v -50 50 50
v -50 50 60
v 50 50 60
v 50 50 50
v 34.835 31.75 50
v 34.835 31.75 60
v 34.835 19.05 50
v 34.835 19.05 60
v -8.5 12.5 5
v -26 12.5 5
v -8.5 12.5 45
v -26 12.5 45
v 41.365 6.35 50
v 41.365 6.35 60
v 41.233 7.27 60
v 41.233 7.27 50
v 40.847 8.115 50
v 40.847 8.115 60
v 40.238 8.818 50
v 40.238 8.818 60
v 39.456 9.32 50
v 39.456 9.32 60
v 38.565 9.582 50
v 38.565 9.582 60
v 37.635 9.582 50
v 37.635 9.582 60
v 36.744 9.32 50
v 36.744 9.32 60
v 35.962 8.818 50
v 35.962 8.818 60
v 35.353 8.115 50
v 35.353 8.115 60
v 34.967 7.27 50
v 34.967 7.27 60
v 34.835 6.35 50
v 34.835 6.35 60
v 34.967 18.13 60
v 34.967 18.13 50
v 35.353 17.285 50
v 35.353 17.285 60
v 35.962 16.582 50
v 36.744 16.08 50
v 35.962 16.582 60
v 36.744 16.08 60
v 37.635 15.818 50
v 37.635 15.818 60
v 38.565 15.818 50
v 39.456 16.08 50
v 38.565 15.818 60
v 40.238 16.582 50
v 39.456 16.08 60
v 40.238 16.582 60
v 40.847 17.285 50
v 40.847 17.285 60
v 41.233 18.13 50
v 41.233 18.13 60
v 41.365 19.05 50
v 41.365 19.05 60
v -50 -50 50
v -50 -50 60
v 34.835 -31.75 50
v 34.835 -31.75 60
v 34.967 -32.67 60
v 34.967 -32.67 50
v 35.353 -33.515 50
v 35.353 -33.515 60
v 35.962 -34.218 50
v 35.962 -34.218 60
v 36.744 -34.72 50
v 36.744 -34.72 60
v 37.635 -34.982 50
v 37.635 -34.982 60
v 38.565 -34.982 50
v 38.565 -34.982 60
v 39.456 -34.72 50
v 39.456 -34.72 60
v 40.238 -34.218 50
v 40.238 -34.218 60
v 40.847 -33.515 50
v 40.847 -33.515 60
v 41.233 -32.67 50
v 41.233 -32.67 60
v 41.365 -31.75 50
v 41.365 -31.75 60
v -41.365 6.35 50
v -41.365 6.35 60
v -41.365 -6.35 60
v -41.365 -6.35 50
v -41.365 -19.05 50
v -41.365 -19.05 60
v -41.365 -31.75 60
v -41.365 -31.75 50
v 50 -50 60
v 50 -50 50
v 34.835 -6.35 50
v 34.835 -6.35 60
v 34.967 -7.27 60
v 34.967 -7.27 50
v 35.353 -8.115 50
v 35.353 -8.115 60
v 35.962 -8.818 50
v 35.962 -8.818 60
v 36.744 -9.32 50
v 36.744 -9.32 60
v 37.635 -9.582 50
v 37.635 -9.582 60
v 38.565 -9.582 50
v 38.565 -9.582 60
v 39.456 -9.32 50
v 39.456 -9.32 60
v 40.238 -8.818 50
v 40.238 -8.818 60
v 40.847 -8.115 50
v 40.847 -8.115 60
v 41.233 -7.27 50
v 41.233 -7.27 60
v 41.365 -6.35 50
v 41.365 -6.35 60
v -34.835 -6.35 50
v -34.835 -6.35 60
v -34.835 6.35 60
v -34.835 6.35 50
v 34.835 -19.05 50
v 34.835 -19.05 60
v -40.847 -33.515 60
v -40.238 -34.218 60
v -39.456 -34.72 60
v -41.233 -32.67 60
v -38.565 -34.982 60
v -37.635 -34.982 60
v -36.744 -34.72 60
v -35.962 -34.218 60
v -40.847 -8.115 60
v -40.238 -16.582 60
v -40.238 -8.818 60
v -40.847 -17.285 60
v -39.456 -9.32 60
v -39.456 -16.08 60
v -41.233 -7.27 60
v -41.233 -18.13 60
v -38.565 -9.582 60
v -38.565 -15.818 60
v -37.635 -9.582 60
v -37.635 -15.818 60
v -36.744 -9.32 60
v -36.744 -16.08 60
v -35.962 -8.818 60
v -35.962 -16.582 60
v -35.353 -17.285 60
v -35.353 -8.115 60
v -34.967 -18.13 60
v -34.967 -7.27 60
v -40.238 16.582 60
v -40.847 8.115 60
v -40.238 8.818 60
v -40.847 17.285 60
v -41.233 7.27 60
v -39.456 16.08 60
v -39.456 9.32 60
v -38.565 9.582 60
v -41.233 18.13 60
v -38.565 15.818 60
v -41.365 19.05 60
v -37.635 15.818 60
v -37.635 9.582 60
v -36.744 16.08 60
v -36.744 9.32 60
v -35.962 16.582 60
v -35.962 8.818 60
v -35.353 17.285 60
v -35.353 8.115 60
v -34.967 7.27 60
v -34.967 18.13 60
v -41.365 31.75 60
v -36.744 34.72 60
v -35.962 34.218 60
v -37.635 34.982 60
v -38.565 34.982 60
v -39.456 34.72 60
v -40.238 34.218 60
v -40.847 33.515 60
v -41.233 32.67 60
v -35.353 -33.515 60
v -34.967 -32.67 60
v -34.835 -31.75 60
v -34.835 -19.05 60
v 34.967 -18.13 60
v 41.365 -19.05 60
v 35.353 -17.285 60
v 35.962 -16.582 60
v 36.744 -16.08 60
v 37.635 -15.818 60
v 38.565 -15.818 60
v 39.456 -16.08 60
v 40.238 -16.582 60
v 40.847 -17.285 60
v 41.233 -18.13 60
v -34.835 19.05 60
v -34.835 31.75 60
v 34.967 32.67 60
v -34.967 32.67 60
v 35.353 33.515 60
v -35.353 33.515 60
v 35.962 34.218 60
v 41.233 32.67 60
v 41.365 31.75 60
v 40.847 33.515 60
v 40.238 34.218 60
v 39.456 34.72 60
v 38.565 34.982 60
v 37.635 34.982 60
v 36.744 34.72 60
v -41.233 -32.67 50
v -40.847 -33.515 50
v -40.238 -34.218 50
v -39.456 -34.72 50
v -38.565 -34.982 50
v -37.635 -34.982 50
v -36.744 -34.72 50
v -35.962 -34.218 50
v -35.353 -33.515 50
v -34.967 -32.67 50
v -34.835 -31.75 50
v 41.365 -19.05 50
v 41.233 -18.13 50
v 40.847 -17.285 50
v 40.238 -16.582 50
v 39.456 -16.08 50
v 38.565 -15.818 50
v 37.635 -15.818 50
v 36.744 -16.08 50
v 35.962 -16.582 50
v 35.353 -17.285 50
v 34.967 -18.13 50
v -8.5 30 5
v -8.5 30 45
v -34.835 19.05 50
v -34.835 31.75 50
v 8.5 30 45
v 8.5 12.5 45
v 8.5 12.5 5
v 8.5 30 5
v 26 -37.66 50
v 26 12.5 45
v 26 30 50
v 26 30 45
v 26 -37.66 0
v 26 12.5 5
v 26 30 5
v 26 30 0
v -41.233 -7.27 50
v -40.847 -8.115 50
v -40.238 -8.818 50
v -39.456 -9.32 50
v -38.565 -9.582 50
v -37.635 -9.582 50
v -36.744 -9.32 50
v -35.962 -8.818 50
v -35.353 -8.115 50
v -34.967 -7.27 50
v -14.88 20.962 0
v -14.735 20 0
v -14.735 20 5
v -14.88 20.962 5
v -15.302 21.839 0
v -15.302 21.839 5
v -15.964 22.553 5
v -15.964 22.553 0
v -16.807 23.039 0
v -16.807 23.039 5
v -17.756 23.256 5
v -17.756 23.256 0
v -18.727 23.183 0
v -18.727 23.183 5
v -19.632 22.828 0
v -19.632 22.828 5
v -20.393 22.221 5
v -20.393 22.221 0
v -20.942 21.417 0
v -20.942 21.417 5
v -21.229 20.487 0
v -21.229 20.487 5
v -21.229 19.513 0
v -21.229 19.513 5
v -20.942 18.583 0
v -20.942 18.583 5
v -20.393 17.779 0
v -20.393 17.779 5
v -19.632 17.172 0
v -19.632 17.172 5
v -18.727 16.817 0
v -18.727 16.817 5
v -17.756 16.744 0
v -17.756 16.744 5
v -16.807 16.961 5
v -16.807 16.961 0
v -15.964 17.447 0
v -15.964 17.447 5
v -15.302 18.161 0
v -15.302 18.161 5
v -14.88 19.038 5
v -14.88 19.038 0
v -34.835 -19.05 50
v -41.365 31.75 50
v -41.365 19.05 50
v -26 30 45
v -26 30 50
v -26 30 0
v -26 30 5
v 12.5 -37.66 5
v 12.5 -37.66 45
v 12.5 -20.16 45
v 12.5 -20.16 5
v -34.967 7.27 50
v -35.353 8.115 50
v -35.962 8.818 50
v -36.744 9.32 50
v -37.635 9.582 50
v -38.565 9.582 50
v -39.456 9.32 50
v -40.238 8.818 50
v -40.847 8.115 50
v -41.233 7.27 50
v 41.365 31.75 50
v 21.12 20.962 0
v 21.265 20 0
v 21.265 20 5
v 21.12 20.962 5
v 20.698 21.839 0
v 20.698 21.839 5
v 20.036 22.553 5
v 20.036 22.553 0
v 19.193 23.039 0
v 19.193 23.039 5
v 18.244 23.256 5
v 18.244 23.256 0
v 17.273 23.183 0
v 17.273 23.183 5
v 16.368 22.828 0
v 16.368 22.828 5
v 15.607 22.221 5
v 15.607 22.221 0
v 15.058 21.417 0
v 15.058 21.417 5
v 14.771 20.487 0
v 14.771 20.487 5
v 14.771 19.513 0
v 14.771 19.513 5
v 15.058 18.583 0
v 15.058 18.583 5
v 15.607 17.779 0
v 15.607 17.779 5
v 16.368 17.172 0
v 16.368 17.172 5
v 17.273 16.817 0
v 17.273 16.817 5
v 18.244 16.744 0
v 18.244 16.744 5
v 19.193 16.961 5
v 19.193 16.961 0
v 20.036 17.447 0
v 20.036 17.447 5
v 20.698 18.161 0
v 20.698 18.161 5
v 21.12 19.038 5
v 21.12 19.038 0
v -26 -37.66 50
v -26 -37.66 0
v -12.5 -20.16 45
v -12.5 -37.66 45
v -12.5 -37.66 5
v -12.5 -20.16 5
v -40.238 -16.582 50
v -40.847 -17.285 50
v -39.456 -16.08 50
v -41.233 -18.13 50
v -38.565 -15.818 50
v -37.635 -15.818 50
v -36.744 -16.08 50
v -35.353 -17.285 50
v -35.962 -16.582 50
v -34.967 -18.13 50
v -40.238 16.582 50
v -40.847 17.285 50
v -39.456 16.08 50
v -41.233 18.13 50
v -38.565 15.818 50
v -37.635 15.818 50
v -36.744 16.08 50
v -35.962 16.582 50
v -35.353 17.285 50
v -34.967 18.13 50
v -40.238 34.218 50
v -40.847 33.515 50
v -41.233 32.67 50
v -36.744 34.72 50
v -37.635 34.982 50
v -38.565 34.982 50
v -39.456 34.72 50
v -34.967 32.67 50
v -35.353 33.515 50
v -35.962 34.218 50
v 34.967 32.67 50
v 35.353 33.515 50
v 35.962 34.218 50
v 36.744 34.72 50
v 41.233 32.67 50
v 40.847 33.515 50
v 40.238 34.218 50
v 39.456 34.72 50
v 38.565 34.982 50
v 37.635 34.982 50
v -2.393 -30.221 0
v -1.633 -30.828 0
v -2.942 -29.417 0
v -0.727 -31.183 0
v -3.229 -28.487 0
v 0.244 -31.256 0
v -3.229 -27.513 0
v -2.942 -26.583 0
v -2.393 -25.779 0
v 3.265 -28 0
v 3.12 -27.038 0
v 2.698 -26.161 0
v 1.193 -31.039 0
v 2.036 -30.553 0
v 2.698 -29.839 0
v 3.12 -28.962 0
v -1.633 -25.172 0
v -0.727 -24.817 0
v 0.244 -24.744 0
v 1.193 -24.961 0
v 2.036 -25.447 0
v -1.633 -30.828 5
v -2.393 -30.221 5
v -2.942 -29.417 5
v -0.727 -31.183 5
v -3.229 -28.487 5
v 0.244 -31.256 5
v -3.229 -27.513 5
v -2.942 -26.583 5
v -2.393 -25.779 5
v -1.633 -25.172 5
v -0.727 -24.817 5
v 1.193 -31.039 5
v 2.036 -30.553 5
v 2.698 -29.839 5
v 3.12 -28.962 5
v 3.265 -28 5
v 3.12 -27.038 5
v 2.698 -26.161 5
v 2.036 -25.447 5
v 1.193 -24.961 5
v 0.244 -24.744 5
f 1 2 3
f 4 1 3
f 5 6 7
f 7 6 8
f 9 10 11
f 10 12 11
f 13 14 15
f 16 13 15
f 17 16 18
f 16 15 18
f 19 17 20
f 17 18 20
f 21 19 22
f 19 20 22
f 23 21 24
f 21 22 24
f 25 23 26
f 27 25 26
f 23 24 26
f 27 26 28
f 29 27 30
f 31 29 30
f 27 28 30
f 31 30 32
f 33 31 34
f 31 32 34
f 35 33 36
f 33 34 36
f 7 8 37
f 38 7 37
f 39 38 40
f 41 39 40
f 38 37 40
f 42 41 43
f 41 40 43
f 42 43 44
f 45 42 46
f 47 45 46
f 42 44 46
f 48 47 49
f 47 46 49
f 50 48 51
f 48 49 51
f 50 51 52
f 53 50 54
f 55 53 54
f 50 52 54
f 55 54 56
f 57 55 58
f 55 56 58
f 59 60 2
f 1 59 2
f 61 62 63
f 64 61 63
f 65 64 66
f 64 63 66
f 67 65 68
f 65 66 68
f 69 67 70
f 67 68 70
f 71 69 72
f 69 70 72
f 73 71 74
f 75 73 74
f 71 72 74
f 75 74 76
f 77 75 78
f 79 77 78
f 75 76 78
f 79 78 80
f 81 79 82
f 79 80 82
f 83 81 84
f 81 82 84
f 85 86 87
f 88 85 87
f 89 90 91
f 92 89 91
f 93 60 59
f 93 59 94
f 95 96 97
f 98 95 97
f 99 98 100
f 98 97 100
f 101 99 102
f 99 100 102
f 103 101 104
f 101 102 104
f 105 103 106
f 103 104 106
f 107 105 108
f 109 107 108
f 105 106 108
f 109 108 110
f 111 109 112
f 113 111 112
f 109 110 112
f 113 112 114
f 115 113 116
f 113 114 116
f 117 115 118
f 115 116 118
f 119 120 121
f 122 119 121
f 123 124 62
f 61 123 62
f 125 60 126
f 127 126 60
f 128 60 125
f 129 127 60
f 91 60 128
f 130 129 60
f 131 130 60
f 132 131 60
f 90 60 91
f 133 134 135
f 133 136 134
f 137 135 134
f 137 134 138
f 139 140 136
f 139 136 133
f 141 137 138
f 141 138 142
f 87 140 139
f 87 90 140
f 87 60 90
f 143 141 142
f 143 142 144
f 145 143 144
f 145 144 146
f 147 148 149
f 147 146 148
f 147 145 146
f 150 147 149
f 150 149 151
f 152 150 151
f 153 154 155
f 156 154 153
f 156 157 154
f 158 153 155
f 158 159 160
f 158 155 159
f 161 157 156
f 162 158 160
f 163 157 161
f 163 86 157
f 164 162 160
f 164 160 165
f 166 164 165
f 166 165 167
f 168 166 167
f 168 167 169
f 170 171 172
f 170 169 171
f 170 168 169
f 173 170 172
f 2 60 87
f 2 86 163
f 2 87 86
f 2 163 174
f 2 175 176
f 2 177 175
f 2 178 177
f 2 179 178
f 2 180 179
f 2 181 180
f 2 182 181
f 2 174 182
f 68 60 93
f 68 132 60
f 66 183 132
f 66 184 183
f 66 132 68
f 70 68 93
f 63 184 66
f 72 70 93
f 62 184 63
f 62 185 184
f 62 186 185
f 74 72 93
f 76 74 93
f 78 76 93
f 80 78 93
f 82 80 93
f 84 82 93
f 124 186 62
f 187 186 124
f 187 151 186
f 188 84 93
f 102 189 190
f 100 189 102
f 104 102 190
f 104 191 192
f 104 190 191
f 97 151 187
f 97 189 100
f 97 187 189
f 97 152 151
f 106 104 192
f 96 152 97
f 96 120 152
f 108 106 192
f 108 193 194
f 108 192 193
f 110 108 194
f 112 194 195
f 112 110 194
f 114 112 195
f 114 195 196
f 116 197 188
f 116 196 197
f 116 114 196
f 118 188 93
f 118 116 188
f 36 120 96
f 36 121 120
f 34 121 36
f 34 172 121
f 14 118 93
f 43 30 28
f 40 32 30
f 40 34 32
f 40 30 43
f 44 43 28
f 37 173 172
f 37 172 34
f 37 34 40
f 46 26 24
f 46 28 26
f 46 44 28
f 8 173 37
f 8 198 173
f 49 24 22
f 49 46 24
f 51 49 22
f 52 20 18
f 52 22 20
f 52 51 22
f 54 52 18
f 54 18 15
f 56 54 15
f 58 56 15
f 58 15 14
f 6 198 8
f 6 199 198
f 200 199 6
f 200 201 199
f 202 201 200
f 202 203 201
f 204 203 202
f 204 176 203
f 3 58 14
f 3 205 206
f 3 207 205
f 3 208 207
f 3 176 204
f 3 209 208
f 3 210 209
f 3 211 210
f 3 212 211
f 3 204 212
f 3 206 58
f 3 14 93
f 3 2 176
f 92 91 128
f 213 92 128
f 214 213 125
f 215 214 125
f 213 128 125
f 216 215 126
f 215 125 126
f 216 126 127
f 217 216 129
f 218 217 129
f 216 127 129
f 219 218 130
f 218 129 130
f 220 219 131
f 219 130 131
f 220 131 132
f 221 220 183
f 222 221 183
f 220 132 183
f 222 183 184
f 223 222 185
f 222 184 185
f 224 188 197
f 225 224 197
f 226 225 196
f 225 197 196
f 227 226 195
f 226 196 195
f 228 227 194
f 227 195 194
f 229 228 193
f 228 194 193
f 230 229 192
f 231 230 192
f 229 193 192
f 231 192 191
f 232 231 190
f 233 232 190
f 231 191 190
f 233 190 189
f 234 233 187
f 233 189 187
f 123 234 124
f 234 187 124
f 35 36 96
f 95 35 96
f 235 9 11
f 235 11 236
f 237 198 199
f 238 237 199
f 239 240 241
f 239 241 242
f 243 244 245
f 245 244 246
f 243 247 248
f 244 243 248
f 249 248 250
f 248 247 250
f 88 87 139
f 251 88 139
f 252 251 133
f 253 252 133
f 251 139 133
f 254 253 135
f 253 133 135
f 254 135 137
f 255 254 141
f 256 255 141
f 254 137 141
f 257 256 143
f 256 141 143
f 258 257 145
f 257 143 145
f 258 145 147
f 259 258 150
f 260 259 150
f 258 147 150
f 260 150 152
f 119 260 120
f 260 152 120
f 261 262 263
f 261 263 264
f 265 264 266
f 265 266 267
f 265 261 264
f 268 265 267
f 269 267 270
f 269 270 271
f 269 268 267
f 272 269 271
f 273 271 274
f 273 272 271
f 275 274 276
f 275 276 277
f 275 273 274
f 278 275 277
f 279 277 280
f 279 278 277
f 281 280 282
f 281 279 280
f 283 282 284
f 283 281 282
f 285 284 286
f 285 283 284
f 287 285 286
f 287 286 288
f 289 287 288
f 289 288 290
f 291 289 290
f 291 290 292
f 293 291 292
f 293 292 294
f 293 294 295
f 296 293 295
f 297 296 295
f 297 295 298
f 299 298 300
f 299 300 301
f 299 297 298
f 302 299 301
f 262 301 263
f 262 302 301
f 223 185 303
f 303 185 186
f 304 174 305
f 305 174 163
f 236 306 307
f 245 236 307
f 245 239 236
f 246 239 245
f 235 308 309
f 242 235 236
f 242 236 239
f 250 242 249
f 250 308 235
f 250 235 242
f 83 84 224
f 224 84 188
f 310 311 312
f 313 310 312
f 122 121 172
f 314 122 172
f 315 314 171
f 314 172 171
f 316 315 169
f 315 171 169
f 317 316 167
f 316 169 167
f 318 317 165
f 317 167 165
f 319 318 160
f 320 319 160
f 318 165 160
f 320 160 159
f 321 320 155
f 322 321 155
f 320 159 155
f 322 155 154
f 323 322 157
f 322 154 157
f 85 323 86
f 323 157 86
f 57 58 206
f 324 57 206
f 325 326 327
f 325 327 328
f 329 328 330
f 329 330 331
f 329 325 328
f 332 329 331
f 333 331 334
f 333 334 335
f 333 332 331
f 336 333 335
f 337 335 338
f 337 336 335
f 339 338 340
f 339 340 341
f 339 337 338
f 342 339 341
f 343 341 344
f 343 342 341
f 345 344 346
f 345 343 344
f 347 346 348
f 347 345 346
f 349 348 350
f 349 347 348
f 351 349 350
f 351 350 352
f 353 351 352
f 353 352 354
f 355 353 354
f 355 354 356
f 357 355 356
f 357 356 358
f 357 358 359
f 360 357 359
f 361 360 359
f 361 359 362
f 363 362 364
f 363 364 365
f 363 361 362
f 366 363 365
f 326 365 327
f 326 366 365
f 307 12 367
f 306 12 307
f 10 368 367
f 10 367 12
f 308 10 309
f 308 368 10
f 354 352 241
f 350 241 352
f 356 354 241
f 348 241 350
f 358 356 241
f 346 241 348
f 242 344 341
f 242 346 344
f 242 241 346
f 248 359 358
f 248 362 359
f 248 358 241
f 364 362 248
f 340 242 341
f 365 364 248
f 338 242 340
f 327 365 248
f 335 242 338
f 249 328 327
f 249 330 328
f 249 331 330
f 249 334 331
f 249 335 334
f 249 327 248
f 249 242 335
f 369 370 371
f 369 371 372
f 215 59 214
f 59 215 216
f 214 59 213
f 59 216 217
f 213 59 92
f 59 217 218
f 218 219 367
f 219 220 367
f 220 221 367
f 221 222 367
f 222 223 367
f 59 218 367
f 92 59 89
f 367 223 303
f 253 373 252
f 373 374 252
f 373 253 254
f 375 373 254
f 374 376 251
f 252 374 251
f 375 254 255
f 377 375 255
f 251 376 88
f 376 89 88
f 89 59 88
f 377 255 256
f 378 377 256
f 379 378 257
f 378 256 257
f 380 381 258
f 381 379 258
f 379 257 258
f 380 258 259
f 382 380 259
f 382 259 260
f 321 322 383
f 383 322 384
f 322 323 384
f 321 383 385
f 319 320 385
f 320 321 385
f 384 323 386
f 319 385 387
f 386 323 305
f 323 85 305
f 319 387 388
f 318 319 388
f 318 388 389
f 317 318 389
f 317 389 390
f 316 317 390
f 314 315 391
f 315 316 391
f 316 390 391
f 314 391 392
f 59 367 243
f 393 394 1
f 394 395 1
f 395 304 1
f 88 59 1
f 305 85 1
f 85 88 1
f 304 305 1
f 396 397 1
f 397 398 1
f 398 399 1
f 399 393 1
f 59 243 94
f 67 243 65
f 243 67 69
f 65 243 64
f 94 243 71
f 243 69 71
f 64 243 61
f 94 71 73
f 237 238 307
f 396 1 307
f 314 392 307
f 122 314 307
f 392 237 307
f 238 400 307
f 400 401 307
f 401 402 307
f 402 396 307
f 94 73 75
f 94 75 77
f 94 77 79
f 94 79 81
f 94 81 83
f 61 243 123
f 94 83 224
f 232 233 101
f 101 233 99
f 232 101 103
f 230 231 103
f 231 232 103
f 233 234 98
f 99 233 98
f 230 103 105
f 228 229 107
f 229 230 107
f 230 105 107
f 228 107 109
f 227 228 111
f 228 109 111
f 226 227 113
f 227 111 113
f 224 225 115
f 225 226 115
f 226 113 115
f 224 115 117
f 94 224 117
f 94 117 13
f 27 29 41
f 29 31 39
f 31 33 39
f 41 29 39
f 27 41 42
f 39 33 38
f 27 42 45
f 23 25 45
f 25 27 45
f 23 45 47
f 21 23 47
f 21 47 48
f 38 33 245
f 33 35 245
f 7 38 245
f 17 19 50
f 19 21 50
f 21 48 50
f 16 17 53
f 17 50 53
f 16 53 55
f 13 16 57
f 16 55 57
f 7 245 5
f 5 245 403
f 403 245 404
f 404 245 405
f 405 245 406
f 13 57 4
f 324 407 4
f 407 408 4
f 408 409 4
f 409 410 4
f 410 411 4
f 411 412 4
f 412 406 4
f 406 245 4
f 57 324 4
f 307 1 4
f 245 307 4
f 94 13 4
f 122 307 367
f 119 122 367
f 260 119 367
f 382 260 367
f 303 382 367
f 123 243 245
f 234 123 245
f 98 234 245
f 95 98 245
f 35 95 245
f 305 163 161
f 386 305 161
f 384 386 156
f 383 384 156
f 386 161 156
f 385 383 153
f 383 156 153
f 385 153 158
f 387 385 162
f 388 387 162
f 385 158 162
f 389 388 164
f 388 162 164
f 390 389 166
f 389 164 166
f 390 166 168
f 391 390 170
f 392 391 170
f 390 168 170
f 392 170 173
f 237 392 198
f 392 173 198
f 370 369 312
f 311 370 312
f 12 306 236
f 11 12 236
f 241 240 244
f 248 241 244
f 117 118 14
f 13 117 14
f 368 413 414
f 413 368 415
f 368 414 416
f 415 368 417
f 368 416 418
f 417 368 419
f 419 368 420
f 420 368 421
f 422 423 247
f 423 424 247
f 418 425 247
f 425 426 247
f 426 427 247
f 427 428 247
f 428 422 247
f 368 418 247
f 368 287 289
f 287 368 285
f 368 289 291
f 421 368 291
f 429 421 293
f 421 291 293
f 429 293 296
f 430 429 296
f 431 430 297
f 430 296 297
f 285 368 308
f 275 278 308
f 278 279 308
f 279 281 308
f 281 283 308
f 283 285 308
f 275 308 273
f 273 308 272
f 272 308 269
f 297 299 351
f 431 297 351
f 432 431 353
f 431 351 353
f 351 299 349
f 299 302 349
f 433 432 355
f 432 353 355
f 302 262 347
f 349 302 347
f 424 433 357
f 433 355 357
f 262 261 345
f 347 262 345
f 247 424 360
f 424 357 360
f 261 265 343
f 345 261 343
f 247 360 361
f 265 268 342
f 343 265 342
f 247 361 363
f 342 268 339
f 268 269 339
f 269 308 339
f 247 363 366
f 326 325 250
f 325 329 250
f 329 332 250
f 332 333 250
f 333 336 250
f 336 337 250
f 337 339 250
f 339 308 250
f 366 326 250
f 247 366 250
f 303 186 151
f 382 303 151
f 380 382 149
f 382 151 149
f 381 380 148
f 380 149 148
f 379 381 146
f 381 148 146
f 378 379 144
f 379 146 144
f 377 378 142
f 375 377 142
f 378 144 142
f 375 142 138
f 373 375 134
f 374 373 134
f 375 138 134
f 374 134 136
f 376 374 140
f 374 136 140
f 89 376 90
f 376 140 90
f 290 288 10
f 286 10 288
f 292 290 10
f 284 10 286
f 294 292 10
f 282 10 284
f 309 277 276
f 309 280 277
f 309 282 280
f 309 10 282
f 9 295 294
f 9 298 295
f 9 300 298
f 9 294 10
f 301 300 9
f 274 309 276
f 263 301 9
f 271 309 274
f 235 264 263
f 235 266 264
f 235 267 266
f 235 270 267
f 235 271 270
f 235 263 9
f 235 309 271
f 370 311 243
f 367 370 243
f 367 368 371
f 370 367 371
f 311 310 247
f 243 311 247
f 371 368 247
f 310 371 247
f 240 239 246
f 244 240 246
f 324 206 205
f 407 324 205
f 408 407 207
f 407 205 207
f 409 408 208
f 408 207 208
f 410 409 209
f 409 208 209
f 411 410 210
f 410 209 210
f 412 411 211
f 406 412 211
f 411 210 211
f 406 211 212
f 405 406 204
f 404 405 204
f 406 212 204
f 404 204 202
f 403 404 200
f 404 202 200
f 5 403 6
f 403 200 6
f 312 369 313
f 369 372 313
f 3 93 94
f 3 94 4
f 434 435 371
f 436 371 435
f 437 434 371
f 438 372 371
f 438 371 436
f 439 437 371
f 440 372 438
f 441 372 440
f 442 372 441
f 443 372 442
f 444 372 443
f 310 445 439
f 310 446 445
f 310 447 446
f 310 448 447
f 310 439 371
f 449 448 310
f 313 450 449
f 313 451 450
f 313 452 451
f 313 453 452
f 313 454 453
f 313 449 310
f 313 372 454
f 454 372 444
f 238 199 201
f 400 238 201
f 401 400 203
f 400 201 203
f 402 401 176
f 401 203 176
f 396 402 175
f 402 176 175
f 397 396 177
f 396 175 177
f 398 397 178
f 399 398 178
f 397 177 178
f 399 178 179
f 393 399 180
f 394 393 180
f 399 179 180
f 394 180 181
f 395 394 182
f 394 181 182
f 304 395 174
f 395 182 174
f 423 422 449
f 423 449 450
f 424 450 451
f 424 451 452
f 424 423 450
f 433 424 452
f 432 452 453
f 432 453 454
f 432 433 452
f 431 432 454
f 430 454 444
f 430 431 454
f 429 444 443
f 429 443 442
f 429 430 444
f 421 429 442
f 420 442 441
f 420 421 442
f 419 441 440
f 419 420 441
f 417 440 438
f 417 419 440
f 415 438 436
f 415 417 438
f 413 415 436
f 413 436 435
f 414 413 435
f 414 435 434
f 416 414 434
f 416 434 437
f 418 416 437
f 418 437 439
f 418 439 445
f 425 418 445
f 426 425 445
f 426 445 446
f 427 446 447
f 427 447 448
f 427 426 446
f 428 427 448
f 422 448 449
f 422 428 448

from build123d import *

# Parameters (mm, degrees)
F0_W           = 52
F0_H           = 67.66
F2_DEPTH       = 5
F1_R           = 3.265
F3_DEPTH       = 5
F4_W           = 52
F4_H           = 67.66
F5_DEPTH       = 30
F7_W           = 52
F7_H           = 67.66
F8_DEPTH       = 25
F9_W           = 100
F9_H           = 100
F10_DEPTH      = 10
F12_DEPTH      = 10
F6_W           = 17.5
F6_H           = 17.5
F6_W_2         = 25
F13_DEPTH      = 30
F13_DEPTH_BACK = 10


with BuildPart() as f2:
    # F0 (on Top) → F2 (new body)
    with BuildSketch(Plane.XY):
        with Locations((0, -3.83)):
            Rectangle(F0_W, F0_H)
    extrude(amount=F2_DEPTH)

    # F1 (on face) → F3 (cut)
    with BuildSketch(Plane.XY):
        with Locations((-18, 20)):
            Circle(F1_R)
        with Locations((18, 20)):
            Circle(F1_R)
        with Locations((0, -28)):
            Circle(F1_R)
    extrude(amount=F3_DEPTH, mode=Mode.SUBTRACT)

    # F4 (on face) → F5 (join)
    with BuildSketch(Plane.XY.offset(5)):
        with Locations((0, -3.83)):
            Rectangle(F4_W, F4_H)
    extrude(amount=F5_DEPTH)

    # F7 (on face) → F8 (join)
    with BuildSketch(Plane.XY.offset(35)):
        with Locations((0, -3.83)):
            Rectangle(F7_W, F7_H)
    extrude(amount=F8_DEPTH)

    # F9 (on face) → F10 (join)
    with BuildSketch(Plane.XY.offset(60)):
        Rectangle(F9_W, F9_H)
    extrude(amount=-F10_DEPTH)

    # F11 (on face) → F12 (cut)
    with BuildSketch(Plane.XY.offset(60)):
        with BuildLine():
            Line((34.835, -6.35), (41.365, -6.35))
            ThreePointArc((41.365, -6.35), (38.1, -3.085), (34.835, -6.35))
        make_face()
        with BuildLine():
            ThreePointArc((34.835, -6.35), (38.1, -9.615), (41.365, -6.35))
            Line((41.365, -6.35), (34.835, -6.35))
        make_face()
        with BuildLine():
            ThreePointArc((34.835, -6.35), (38.1, -3.085), (41.365, -6.35))
            Line((41.365, -6.35), (41.365, 6.35))
            ThreePointArc((41.365, 6.35), (38.1, 3.085), (34.835, 6.35))
            Line((34.835, 6.35), (34.835, -6.35))
        make_face()
        with BuildLine():
            Line((34.835, 6.35), (41.365, 6.35))
            ThreePointArc((41.365, 6.35), (38.1, 9.615), (34.835, 6.35))
        make_face()
        with BuildLine():
            ThreePointArc((34.835, 6.35), (38.1, 3.085), (41.365, 6.35))
            Line((41.365, 6.35), (34.835, 6.35))
        make_face()
        with BuildLine():
            Line((34.835, -31.75), (41.365, -31.75))
            ThreePointArc((41.365, -31.75), (38.1, -28.485), (34.835, -31.75))
        make_face()
        with BuildLine():
            ThreePointArc((34.835, -31.75), (38.1, -35.015), (41.365, -31.75))
            Line((41.365, -31.75), (34.835, -31.75))
        make_face()
        with BuildLine():
            ThreePointArc((34.835, -31.75), (38.1, -28.485), (41.365, -31.75))
            Line((41.365, -31.75), (41.365, -19.05))
            ThreePointArc((41.365, -19.05), (38.1, -22.315), (34.835, -19.05))
            Line((34.835, -19.05), (34.835, -31.75))
        make_face()
        with BuildLine():
            Line((34.835, -19.05), (41.365, -19.05))
            ThreePointArc((41.365, -19.05), (38.1, -15.785), (34.835, -19.05))
        make_face()
        with BuildLine():
            ThreePointArc((34.835, -19.05), (38.1, -22.315), (41.365, -19.05))
            Line((41.365, -19.05), (34.835, -19.05))
        make_face()
        with BuildLine():
            ThreePointArc((34.835, 31.75), (38.1, 28.485), (41.365, 31.75))
            ThreePointArc((41.365, 31.75), (38.1, 35.015), (34.835, 31.75))
        make_face()
        with BuildLine():
            Line((41.365, 19.05), (41.365, 31.75))
            ThreePointArc((41.365, 31.75), (38.1, 28.485), (34.835, 31.75))
            Line((34.835, 31.75), (34.835, 19.05))
            ThreePointArc((34.835, 19.05), (38.1, 22.315), (41.365, 19.05))
        make_face()
        with BuildLine():
            ThreePointArc((34.835, 19.05), (38.1, 15.785), (41.365, 19.05))
            ThreePointArc((41.365, 19.05), (38.1, 22.315), (34.835, 19.05))
        make_face()
        with BuildLine():
            ThreePointArc((-41.365, -31.75), (-38.1, -35.015), (-34.835, -31.75))
            ThreePointArc((-34.835, -31.75), (-38.1, -28.485), (-41.365, -31.75))
        make_face()
        with BuildLine():
            ThreePointArc((-41.365, -31.75), (-38.1, -28.485), (-34.835, -31.75))
            Line((-34.835, -31.75), (-34.835, -19.05))
            ThreePointArc((-34.835, -19.05), (-38.1, -22.315), (-41.365, -19.05))
            Line((-41.365, -19.05), (-41.365, -31.75))
        make_face()
        with BuildLine():
            ThreePointArc((-41.365, -19.05), (-38.1, -22.315), (-34.835, -19.05))
            ThreePointArc((-34.835, -19.05), (-38.1, -15.785), (-41.365, -19.05))
        make_face()
        with BuildLine():
            ThreePointArc((-41.365, -6.35), (-38.1, -9.615), (-34.835, -6.35))
            ThreePointArc((-34.835, -6.35), (-38.1, -3.085), (-41.365, -6.35))
        make_face()
        with BuildLine():
            ThreePointArc((-41.365, -6.35), (-38.1, -3.085), (-34.835, -6.35))
            Line((-34.835, -6.35), (-34.835, 6.35))
            ThreePointArc((-34.835, 6.35), (-38.1, 3.085), (-41.365, 6.35))
            Line((-41.365, 6.35), (-41.365, -6.35))
        make_face()
        with BuildLine():
            ThreePointArc((-41.365, 6.35), (-38.1, 3.085), (-34.835, 6.35))
            ThreePointArc((-34.835, 6.35), (-38.1, 9.615), (-41.365, 6.35))
        make_face()
        with BuildLine():
            ThreePointArc((-41.365, 19.05), (-38.1, 15.785), (-34.835, 19.05))
            ThreePointArc((-34.835, 19.05), (-38.1, 22.315), (-41.365, 19.05))
        make_face()
        with BuildLine():
            ThreePointArc((-41.365, 19.05), (-38.1, 22.315), (-34.835, 19.05))
            Line((-34.835, 19.05), (-34.835, 31.75))
            ThreePointArc((-34.835, 31.75), (-38.1, 28.485), (-41.365, 31.75))
            Line((-41.365, 31.75), (-41.365, 19.05))
        make_face()
        with BuildLine():
            ThreePointArc((-41.365, 31.75), (-38.1, 28.485), (-34.835, 31.75))
            ThreePointArc((-34.835, 31.75), (-38.1, 35.015), (-41.365, 31.75))
        make_face()
    extrude(amount=-F12_DEPTH, mode=Mode.SUBTRACT)

    # F6 (on face) → F13 (cut, two sides)
    with BuildSketch(Plane.XY.offset(35)) as f13_sk:
        with Locations((-17.25, 21.25)):
            Rectangle(F6_W, F6_H)
        with Locations((17.25, 21.25)):
            Rectangle(F6_W, F6_H)
        with Locations((0, -28.91)):
            Rectangle(F6_W_2, F6_H)
    extrude(amount=-F13_DEPTH, mode=Mode.SUBTRACT)
    extrude(f13_sk.sketch, amount=F13_DEPTH_BACK, mode=Mode.SUBTRACT)


solid = f2.part
